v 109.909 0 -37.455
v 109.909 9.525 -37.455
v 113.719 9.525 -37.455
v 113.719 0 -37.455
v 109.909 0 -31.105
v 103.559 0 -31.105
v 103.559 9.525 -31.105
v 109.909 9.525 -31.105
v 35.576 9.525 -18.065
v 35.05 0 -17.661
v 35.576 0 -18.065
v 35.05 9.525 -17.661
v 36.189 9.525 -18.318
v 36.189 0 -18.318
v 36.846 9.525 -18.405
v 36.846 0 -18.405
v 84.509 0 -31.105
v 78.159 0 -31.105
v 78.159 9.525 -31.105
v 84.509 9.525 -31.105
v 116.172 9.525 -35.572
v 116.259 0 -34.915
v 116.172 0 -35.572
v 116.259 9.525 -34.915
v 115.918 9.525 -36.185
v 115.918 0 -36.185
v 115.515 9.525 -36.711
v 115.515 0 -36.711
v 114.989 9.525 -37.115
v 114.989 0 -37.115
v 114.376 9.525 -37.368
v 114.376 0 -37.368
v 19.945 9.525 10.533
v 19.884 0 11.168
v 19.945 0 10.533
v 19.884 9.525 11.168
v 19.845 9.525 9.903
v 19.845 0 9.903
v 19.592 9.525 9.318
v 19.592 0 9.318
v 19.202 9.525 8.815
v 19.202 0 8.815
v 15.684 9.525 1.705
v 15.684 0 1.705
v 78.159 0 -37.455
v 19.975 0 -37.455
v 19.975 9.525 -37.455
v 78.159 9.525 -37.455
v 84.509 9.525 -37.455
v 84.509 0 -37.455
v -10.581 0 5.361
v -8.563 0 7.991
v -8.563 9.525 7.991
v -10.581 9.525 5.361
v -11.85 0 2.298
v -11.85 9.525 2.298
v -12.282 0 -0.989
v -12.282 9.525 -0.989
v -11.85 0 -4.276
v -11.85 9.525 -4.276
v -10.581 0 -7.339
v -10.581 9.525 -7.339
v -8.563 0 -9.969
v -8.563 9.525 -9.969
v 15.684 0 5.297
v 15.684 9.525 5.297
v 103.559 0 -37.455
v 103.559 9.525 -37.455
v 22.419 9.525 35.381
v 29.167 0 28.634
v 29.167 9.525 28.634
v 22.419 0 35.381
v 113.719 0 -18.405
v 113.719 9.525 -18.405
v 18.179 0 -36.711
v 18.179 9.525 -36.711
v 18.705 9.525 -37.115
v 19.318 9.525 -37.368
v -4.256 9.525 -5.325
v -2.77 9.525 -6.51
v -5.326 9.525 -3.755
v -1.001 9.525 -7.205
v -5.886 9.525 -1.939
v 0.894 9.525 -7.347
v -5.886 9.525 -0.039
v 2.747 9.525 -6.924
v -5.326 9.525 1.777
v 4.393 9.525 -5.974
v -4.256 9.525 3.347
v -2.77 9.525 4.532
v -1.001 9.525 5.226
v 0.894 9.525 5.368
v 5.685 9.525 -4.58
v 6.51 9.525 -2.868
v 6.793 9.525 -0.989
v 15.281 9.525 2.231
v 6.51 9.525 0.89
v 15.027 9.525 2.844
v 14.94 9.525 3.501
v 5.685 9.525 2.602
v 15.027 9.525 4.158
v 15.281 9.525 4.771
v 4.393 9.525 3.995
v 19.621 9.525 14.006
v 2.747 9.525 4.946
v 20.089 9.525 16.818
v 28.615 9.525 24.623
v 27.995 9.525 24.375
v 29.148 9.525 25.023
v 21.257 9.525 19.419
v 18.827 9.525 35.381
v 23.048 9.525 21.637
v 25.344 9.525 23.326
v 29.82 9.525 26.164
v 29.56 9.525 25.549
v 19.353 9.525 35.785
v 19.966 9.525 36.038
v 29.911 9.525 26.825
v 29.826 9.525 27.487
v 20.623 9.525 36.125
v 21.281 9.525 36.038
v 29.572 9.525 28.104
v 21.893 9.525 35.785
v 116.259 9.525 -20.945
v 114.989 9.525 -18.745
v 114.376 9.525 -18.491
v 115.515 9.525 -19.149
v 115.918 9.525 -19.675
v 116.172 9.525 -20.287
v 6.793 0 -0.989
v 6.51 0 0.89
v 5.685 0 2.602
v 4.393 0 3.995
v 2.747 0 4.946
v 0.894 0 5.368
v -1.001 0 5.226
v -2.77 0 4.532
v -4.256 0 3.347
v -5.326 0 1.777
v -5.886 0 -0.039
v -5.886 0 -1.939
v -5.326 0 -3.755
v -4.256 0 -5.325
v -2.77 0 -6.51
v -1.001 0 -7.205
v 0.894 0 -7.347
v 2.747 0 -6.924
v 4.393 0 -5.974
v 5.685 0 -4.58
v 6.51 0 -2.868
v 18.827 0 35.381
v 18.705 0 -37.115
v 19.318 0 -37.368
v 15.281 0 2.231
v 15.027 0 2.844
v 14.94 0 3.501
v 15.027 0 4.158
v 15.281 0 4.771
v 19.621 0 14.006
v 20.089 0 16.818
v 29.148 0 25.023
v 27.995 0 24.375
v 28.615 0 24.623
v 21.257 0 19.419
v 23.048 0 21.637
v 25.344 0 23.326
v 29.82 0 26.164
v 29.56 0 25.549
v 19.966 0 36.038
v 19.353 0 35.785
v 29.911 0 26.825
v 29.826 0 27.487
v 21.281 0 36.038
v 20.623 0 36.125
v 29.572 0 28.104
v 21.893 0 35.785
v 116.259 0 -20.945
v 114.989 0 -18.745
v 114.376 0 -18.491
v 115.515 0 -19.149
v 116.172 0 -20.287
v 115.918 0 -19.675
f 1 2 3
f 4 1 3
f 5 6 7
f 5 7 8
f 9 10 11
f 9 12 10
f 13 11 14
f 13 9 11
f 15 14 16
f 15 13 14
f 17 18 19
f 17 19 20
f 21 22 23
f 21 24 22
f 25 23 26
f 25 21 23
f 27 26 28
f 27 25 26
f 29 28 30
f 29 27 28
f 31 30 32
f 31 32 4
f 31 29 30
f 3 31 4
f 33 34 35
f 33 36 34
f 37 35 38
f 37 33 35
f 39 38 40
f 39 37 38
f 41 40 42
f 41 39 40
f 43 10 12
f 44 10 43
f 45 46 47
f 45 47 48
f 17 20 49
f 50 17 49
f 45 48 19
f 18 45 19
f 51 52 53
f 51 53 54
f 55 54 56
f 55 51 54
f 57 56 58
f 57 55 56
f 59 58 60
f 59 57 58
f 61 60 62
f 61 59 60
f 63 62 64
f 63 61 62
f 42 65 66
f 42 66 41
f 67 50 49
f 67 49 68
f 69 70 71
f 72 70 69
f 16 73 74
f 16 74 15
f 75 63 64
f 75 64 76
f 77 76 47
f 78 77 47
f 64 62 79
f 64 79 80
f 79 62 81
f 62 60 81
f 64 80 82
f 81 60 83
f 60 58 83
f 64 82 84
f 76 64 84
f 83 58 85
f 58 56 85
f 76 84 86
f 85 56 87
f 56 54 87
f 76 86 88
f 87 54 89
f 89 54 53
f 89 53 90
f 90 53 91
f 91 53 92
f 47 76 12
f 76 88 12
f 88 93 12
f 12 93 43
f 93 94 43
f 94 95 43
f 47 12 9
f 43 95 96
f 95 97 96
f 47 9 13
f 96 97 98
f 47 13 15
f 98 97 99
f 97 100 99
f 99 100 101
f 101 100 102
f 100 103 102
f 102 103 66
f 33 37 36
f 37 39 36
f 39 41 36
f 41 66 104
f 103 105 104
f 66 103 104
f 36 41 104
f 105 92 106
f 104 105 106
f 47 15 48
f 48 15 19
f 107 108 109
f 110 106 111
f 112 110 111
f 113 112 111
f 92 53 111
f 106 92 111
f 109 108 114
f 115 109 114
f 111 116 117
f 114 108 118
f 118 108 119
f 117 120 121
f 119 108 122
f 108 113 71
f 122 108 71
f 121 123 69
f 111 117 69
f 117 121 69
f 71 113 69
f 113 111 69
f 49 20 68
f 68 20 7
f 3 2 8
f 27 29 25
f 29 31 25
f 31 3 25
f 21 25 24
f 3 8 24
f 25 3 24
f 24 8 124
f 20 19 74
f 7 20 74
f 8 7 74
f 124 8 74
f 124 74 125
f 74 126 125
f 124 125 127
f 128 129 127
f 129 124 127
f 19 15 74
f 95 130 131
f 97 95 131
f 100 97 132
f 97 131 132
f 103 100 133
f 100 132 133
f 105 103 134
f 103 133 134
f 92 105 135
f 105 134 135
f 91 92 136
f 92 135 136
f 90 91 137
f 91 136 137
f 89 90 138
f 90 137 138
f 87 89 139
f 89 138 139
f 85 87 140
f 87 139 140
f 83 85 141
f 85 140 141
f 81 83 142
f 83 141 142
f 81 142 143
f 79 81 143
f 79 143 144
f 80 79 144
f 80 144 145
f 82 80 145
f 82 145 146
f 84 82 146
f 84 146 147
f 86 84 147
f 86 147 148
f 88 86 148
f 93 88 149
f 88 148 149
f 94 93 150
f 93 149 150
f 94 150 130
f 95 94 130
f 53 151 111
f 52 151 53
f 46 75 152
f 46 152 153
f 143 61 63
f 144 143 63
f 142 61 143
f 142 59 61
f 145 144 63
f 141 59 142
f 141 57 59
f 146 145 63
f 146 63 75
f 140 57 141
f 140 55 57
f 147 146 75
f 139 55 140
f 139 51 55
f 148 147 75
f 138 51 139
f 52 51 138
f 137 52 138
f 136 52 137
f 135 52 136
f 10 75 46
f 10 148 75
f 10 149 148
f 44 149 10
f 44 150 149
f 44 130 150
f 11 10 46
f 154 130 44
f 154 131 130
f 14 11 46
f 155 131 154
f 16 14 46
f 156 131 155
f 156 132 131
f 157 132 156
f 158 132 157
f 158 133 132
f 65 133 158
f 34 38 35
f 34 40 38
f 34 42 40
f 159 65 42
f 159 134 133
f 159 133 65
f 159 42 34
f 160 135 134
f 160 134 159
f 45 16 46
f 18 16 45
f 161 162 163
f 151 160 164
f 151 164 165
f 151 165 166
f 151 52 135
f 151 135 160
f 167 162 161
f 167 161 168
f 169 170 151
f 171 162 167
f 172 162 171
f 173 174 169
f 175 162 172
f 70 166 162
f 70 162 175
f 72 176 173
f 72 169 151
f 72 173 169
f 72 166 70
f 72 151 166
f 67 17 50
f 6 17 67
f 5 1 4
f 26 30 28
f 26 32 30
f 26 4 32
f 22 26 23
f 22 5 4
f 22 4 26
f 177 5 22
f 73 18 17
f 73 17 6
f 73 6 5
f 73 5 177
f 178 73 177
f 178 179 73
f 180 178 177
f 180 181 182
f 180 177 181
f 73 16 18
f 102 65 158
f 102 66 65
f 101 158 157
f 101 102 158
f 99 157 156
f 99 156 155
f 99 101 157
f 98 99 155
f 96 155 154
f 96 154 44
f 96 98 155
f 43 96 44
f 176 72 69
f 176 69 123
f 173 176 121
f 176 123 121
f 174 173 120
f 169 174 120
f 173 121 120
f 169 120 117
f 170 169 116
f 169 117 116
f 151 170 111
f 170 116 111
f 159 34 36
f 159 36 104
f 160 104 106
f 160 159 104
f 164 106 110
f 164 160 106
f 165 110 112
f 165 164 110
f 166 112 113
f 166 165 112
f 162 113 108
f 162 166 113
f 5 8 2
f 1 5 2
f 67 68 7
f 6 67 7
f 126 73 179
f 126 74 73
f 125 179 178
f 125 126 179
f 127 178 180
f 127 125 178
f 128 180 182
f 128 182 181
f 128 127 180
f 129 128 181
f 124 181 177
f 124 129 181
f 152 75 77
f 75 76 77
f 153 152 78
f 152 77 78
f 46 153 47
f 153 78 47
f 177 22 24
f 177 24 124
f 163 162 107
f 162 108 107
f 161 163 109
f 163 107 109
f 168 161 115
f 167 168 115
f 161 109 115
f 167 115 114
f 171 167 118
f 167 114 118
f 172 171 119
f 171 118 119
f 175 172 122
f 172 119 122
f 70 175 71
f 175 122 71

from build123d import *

# Parameters (mm, degrees)
F0_R     = 6.3754
F1_DEPTH = 9.525
F2_R     = 2.54
F3_R     = 2.54


with BuildPart() as f1:
    # F0 (on Front) → F1 (new body)
    with BuildSketch(Plane.XZ):
        with BuildLine():
            ThreePointArc((20.258996, 9.87189), (22.492237, 21.066453), (33.413953, 24.386349))
            Line((33.413953, 24.386349), (20.62332, 37.176983))
            Line((20.62332, 37.176983), (-8.562513, 7.99115))
            ThreePointArc((-8.562513, 7.99115), (-12.282257, -0.989106), (-8.562513, -9.969362))
            Line((-8.562513, -9.969362), (18.922999, -37.454874))
            Line((18.922999, -37.454874), (78.158512, -37.454874))
            Line((78.158512, -37.454874), (78.158512, -31.104874))
            Line((78.158512, -31.104874), (84.508512, -31.104874))
            Line((84.508512, -31.104874), (84.508512, -37.454874))
            Line((84.508512, -37.454874), (103.558512, -37.454874))
            Line((103.558512, -37.454874), (103.558512, -31.104874))
            Line((103.558512, -31.104874), (109.908512, -31.104874))
            Line((109.908512, -31.104874), (109.908512, -37.454874))
            Line((109.908512, -37.454874), (116.258512, -37.454874))
            Line((116.258512, -37.454874), (116.258512, -18.404874))
            Line((116.258512, -18.404874), (35.794024, -18.404874))
            Line((35.794024, -18.404874), (13.888128, 3.501022))
            Line((13.888128, 3.501022), (20.258996, 9.87189))
        make_face()
        with Locations((0.417743, -0.989106)):
            Circle(F0_R, mode=Mode.SUBTRACT)
    extrude(amount=-F1_DEPTH)

    # F2
    f2_edges = [f1.edges().sort_by_distance(p)[0] for p in [
        (33.413953, 4.7625, 24.386349),
        (20.258996, 4.7625, 9.87189),
    ]]
    fillet(f2_edges, radius=F2_R)

    # F3
    f3_edges = [f1.edges().sort_by_distance(p)[0] for p in [
        (13.888128, 4.7625, 3.501022),
        (35.794024, 4.7625, -18.404874),
        (18.922999, 4.7625, -37.454874),
        (116.258512, 4.7625, -18.404874),
        (116.258512, 4.7625, -37.454874),
        (20.62332, 4.7625, 37.176983),
    ]]
    fillet(f3_edges, radius=F3_R)


solid = f1.part
